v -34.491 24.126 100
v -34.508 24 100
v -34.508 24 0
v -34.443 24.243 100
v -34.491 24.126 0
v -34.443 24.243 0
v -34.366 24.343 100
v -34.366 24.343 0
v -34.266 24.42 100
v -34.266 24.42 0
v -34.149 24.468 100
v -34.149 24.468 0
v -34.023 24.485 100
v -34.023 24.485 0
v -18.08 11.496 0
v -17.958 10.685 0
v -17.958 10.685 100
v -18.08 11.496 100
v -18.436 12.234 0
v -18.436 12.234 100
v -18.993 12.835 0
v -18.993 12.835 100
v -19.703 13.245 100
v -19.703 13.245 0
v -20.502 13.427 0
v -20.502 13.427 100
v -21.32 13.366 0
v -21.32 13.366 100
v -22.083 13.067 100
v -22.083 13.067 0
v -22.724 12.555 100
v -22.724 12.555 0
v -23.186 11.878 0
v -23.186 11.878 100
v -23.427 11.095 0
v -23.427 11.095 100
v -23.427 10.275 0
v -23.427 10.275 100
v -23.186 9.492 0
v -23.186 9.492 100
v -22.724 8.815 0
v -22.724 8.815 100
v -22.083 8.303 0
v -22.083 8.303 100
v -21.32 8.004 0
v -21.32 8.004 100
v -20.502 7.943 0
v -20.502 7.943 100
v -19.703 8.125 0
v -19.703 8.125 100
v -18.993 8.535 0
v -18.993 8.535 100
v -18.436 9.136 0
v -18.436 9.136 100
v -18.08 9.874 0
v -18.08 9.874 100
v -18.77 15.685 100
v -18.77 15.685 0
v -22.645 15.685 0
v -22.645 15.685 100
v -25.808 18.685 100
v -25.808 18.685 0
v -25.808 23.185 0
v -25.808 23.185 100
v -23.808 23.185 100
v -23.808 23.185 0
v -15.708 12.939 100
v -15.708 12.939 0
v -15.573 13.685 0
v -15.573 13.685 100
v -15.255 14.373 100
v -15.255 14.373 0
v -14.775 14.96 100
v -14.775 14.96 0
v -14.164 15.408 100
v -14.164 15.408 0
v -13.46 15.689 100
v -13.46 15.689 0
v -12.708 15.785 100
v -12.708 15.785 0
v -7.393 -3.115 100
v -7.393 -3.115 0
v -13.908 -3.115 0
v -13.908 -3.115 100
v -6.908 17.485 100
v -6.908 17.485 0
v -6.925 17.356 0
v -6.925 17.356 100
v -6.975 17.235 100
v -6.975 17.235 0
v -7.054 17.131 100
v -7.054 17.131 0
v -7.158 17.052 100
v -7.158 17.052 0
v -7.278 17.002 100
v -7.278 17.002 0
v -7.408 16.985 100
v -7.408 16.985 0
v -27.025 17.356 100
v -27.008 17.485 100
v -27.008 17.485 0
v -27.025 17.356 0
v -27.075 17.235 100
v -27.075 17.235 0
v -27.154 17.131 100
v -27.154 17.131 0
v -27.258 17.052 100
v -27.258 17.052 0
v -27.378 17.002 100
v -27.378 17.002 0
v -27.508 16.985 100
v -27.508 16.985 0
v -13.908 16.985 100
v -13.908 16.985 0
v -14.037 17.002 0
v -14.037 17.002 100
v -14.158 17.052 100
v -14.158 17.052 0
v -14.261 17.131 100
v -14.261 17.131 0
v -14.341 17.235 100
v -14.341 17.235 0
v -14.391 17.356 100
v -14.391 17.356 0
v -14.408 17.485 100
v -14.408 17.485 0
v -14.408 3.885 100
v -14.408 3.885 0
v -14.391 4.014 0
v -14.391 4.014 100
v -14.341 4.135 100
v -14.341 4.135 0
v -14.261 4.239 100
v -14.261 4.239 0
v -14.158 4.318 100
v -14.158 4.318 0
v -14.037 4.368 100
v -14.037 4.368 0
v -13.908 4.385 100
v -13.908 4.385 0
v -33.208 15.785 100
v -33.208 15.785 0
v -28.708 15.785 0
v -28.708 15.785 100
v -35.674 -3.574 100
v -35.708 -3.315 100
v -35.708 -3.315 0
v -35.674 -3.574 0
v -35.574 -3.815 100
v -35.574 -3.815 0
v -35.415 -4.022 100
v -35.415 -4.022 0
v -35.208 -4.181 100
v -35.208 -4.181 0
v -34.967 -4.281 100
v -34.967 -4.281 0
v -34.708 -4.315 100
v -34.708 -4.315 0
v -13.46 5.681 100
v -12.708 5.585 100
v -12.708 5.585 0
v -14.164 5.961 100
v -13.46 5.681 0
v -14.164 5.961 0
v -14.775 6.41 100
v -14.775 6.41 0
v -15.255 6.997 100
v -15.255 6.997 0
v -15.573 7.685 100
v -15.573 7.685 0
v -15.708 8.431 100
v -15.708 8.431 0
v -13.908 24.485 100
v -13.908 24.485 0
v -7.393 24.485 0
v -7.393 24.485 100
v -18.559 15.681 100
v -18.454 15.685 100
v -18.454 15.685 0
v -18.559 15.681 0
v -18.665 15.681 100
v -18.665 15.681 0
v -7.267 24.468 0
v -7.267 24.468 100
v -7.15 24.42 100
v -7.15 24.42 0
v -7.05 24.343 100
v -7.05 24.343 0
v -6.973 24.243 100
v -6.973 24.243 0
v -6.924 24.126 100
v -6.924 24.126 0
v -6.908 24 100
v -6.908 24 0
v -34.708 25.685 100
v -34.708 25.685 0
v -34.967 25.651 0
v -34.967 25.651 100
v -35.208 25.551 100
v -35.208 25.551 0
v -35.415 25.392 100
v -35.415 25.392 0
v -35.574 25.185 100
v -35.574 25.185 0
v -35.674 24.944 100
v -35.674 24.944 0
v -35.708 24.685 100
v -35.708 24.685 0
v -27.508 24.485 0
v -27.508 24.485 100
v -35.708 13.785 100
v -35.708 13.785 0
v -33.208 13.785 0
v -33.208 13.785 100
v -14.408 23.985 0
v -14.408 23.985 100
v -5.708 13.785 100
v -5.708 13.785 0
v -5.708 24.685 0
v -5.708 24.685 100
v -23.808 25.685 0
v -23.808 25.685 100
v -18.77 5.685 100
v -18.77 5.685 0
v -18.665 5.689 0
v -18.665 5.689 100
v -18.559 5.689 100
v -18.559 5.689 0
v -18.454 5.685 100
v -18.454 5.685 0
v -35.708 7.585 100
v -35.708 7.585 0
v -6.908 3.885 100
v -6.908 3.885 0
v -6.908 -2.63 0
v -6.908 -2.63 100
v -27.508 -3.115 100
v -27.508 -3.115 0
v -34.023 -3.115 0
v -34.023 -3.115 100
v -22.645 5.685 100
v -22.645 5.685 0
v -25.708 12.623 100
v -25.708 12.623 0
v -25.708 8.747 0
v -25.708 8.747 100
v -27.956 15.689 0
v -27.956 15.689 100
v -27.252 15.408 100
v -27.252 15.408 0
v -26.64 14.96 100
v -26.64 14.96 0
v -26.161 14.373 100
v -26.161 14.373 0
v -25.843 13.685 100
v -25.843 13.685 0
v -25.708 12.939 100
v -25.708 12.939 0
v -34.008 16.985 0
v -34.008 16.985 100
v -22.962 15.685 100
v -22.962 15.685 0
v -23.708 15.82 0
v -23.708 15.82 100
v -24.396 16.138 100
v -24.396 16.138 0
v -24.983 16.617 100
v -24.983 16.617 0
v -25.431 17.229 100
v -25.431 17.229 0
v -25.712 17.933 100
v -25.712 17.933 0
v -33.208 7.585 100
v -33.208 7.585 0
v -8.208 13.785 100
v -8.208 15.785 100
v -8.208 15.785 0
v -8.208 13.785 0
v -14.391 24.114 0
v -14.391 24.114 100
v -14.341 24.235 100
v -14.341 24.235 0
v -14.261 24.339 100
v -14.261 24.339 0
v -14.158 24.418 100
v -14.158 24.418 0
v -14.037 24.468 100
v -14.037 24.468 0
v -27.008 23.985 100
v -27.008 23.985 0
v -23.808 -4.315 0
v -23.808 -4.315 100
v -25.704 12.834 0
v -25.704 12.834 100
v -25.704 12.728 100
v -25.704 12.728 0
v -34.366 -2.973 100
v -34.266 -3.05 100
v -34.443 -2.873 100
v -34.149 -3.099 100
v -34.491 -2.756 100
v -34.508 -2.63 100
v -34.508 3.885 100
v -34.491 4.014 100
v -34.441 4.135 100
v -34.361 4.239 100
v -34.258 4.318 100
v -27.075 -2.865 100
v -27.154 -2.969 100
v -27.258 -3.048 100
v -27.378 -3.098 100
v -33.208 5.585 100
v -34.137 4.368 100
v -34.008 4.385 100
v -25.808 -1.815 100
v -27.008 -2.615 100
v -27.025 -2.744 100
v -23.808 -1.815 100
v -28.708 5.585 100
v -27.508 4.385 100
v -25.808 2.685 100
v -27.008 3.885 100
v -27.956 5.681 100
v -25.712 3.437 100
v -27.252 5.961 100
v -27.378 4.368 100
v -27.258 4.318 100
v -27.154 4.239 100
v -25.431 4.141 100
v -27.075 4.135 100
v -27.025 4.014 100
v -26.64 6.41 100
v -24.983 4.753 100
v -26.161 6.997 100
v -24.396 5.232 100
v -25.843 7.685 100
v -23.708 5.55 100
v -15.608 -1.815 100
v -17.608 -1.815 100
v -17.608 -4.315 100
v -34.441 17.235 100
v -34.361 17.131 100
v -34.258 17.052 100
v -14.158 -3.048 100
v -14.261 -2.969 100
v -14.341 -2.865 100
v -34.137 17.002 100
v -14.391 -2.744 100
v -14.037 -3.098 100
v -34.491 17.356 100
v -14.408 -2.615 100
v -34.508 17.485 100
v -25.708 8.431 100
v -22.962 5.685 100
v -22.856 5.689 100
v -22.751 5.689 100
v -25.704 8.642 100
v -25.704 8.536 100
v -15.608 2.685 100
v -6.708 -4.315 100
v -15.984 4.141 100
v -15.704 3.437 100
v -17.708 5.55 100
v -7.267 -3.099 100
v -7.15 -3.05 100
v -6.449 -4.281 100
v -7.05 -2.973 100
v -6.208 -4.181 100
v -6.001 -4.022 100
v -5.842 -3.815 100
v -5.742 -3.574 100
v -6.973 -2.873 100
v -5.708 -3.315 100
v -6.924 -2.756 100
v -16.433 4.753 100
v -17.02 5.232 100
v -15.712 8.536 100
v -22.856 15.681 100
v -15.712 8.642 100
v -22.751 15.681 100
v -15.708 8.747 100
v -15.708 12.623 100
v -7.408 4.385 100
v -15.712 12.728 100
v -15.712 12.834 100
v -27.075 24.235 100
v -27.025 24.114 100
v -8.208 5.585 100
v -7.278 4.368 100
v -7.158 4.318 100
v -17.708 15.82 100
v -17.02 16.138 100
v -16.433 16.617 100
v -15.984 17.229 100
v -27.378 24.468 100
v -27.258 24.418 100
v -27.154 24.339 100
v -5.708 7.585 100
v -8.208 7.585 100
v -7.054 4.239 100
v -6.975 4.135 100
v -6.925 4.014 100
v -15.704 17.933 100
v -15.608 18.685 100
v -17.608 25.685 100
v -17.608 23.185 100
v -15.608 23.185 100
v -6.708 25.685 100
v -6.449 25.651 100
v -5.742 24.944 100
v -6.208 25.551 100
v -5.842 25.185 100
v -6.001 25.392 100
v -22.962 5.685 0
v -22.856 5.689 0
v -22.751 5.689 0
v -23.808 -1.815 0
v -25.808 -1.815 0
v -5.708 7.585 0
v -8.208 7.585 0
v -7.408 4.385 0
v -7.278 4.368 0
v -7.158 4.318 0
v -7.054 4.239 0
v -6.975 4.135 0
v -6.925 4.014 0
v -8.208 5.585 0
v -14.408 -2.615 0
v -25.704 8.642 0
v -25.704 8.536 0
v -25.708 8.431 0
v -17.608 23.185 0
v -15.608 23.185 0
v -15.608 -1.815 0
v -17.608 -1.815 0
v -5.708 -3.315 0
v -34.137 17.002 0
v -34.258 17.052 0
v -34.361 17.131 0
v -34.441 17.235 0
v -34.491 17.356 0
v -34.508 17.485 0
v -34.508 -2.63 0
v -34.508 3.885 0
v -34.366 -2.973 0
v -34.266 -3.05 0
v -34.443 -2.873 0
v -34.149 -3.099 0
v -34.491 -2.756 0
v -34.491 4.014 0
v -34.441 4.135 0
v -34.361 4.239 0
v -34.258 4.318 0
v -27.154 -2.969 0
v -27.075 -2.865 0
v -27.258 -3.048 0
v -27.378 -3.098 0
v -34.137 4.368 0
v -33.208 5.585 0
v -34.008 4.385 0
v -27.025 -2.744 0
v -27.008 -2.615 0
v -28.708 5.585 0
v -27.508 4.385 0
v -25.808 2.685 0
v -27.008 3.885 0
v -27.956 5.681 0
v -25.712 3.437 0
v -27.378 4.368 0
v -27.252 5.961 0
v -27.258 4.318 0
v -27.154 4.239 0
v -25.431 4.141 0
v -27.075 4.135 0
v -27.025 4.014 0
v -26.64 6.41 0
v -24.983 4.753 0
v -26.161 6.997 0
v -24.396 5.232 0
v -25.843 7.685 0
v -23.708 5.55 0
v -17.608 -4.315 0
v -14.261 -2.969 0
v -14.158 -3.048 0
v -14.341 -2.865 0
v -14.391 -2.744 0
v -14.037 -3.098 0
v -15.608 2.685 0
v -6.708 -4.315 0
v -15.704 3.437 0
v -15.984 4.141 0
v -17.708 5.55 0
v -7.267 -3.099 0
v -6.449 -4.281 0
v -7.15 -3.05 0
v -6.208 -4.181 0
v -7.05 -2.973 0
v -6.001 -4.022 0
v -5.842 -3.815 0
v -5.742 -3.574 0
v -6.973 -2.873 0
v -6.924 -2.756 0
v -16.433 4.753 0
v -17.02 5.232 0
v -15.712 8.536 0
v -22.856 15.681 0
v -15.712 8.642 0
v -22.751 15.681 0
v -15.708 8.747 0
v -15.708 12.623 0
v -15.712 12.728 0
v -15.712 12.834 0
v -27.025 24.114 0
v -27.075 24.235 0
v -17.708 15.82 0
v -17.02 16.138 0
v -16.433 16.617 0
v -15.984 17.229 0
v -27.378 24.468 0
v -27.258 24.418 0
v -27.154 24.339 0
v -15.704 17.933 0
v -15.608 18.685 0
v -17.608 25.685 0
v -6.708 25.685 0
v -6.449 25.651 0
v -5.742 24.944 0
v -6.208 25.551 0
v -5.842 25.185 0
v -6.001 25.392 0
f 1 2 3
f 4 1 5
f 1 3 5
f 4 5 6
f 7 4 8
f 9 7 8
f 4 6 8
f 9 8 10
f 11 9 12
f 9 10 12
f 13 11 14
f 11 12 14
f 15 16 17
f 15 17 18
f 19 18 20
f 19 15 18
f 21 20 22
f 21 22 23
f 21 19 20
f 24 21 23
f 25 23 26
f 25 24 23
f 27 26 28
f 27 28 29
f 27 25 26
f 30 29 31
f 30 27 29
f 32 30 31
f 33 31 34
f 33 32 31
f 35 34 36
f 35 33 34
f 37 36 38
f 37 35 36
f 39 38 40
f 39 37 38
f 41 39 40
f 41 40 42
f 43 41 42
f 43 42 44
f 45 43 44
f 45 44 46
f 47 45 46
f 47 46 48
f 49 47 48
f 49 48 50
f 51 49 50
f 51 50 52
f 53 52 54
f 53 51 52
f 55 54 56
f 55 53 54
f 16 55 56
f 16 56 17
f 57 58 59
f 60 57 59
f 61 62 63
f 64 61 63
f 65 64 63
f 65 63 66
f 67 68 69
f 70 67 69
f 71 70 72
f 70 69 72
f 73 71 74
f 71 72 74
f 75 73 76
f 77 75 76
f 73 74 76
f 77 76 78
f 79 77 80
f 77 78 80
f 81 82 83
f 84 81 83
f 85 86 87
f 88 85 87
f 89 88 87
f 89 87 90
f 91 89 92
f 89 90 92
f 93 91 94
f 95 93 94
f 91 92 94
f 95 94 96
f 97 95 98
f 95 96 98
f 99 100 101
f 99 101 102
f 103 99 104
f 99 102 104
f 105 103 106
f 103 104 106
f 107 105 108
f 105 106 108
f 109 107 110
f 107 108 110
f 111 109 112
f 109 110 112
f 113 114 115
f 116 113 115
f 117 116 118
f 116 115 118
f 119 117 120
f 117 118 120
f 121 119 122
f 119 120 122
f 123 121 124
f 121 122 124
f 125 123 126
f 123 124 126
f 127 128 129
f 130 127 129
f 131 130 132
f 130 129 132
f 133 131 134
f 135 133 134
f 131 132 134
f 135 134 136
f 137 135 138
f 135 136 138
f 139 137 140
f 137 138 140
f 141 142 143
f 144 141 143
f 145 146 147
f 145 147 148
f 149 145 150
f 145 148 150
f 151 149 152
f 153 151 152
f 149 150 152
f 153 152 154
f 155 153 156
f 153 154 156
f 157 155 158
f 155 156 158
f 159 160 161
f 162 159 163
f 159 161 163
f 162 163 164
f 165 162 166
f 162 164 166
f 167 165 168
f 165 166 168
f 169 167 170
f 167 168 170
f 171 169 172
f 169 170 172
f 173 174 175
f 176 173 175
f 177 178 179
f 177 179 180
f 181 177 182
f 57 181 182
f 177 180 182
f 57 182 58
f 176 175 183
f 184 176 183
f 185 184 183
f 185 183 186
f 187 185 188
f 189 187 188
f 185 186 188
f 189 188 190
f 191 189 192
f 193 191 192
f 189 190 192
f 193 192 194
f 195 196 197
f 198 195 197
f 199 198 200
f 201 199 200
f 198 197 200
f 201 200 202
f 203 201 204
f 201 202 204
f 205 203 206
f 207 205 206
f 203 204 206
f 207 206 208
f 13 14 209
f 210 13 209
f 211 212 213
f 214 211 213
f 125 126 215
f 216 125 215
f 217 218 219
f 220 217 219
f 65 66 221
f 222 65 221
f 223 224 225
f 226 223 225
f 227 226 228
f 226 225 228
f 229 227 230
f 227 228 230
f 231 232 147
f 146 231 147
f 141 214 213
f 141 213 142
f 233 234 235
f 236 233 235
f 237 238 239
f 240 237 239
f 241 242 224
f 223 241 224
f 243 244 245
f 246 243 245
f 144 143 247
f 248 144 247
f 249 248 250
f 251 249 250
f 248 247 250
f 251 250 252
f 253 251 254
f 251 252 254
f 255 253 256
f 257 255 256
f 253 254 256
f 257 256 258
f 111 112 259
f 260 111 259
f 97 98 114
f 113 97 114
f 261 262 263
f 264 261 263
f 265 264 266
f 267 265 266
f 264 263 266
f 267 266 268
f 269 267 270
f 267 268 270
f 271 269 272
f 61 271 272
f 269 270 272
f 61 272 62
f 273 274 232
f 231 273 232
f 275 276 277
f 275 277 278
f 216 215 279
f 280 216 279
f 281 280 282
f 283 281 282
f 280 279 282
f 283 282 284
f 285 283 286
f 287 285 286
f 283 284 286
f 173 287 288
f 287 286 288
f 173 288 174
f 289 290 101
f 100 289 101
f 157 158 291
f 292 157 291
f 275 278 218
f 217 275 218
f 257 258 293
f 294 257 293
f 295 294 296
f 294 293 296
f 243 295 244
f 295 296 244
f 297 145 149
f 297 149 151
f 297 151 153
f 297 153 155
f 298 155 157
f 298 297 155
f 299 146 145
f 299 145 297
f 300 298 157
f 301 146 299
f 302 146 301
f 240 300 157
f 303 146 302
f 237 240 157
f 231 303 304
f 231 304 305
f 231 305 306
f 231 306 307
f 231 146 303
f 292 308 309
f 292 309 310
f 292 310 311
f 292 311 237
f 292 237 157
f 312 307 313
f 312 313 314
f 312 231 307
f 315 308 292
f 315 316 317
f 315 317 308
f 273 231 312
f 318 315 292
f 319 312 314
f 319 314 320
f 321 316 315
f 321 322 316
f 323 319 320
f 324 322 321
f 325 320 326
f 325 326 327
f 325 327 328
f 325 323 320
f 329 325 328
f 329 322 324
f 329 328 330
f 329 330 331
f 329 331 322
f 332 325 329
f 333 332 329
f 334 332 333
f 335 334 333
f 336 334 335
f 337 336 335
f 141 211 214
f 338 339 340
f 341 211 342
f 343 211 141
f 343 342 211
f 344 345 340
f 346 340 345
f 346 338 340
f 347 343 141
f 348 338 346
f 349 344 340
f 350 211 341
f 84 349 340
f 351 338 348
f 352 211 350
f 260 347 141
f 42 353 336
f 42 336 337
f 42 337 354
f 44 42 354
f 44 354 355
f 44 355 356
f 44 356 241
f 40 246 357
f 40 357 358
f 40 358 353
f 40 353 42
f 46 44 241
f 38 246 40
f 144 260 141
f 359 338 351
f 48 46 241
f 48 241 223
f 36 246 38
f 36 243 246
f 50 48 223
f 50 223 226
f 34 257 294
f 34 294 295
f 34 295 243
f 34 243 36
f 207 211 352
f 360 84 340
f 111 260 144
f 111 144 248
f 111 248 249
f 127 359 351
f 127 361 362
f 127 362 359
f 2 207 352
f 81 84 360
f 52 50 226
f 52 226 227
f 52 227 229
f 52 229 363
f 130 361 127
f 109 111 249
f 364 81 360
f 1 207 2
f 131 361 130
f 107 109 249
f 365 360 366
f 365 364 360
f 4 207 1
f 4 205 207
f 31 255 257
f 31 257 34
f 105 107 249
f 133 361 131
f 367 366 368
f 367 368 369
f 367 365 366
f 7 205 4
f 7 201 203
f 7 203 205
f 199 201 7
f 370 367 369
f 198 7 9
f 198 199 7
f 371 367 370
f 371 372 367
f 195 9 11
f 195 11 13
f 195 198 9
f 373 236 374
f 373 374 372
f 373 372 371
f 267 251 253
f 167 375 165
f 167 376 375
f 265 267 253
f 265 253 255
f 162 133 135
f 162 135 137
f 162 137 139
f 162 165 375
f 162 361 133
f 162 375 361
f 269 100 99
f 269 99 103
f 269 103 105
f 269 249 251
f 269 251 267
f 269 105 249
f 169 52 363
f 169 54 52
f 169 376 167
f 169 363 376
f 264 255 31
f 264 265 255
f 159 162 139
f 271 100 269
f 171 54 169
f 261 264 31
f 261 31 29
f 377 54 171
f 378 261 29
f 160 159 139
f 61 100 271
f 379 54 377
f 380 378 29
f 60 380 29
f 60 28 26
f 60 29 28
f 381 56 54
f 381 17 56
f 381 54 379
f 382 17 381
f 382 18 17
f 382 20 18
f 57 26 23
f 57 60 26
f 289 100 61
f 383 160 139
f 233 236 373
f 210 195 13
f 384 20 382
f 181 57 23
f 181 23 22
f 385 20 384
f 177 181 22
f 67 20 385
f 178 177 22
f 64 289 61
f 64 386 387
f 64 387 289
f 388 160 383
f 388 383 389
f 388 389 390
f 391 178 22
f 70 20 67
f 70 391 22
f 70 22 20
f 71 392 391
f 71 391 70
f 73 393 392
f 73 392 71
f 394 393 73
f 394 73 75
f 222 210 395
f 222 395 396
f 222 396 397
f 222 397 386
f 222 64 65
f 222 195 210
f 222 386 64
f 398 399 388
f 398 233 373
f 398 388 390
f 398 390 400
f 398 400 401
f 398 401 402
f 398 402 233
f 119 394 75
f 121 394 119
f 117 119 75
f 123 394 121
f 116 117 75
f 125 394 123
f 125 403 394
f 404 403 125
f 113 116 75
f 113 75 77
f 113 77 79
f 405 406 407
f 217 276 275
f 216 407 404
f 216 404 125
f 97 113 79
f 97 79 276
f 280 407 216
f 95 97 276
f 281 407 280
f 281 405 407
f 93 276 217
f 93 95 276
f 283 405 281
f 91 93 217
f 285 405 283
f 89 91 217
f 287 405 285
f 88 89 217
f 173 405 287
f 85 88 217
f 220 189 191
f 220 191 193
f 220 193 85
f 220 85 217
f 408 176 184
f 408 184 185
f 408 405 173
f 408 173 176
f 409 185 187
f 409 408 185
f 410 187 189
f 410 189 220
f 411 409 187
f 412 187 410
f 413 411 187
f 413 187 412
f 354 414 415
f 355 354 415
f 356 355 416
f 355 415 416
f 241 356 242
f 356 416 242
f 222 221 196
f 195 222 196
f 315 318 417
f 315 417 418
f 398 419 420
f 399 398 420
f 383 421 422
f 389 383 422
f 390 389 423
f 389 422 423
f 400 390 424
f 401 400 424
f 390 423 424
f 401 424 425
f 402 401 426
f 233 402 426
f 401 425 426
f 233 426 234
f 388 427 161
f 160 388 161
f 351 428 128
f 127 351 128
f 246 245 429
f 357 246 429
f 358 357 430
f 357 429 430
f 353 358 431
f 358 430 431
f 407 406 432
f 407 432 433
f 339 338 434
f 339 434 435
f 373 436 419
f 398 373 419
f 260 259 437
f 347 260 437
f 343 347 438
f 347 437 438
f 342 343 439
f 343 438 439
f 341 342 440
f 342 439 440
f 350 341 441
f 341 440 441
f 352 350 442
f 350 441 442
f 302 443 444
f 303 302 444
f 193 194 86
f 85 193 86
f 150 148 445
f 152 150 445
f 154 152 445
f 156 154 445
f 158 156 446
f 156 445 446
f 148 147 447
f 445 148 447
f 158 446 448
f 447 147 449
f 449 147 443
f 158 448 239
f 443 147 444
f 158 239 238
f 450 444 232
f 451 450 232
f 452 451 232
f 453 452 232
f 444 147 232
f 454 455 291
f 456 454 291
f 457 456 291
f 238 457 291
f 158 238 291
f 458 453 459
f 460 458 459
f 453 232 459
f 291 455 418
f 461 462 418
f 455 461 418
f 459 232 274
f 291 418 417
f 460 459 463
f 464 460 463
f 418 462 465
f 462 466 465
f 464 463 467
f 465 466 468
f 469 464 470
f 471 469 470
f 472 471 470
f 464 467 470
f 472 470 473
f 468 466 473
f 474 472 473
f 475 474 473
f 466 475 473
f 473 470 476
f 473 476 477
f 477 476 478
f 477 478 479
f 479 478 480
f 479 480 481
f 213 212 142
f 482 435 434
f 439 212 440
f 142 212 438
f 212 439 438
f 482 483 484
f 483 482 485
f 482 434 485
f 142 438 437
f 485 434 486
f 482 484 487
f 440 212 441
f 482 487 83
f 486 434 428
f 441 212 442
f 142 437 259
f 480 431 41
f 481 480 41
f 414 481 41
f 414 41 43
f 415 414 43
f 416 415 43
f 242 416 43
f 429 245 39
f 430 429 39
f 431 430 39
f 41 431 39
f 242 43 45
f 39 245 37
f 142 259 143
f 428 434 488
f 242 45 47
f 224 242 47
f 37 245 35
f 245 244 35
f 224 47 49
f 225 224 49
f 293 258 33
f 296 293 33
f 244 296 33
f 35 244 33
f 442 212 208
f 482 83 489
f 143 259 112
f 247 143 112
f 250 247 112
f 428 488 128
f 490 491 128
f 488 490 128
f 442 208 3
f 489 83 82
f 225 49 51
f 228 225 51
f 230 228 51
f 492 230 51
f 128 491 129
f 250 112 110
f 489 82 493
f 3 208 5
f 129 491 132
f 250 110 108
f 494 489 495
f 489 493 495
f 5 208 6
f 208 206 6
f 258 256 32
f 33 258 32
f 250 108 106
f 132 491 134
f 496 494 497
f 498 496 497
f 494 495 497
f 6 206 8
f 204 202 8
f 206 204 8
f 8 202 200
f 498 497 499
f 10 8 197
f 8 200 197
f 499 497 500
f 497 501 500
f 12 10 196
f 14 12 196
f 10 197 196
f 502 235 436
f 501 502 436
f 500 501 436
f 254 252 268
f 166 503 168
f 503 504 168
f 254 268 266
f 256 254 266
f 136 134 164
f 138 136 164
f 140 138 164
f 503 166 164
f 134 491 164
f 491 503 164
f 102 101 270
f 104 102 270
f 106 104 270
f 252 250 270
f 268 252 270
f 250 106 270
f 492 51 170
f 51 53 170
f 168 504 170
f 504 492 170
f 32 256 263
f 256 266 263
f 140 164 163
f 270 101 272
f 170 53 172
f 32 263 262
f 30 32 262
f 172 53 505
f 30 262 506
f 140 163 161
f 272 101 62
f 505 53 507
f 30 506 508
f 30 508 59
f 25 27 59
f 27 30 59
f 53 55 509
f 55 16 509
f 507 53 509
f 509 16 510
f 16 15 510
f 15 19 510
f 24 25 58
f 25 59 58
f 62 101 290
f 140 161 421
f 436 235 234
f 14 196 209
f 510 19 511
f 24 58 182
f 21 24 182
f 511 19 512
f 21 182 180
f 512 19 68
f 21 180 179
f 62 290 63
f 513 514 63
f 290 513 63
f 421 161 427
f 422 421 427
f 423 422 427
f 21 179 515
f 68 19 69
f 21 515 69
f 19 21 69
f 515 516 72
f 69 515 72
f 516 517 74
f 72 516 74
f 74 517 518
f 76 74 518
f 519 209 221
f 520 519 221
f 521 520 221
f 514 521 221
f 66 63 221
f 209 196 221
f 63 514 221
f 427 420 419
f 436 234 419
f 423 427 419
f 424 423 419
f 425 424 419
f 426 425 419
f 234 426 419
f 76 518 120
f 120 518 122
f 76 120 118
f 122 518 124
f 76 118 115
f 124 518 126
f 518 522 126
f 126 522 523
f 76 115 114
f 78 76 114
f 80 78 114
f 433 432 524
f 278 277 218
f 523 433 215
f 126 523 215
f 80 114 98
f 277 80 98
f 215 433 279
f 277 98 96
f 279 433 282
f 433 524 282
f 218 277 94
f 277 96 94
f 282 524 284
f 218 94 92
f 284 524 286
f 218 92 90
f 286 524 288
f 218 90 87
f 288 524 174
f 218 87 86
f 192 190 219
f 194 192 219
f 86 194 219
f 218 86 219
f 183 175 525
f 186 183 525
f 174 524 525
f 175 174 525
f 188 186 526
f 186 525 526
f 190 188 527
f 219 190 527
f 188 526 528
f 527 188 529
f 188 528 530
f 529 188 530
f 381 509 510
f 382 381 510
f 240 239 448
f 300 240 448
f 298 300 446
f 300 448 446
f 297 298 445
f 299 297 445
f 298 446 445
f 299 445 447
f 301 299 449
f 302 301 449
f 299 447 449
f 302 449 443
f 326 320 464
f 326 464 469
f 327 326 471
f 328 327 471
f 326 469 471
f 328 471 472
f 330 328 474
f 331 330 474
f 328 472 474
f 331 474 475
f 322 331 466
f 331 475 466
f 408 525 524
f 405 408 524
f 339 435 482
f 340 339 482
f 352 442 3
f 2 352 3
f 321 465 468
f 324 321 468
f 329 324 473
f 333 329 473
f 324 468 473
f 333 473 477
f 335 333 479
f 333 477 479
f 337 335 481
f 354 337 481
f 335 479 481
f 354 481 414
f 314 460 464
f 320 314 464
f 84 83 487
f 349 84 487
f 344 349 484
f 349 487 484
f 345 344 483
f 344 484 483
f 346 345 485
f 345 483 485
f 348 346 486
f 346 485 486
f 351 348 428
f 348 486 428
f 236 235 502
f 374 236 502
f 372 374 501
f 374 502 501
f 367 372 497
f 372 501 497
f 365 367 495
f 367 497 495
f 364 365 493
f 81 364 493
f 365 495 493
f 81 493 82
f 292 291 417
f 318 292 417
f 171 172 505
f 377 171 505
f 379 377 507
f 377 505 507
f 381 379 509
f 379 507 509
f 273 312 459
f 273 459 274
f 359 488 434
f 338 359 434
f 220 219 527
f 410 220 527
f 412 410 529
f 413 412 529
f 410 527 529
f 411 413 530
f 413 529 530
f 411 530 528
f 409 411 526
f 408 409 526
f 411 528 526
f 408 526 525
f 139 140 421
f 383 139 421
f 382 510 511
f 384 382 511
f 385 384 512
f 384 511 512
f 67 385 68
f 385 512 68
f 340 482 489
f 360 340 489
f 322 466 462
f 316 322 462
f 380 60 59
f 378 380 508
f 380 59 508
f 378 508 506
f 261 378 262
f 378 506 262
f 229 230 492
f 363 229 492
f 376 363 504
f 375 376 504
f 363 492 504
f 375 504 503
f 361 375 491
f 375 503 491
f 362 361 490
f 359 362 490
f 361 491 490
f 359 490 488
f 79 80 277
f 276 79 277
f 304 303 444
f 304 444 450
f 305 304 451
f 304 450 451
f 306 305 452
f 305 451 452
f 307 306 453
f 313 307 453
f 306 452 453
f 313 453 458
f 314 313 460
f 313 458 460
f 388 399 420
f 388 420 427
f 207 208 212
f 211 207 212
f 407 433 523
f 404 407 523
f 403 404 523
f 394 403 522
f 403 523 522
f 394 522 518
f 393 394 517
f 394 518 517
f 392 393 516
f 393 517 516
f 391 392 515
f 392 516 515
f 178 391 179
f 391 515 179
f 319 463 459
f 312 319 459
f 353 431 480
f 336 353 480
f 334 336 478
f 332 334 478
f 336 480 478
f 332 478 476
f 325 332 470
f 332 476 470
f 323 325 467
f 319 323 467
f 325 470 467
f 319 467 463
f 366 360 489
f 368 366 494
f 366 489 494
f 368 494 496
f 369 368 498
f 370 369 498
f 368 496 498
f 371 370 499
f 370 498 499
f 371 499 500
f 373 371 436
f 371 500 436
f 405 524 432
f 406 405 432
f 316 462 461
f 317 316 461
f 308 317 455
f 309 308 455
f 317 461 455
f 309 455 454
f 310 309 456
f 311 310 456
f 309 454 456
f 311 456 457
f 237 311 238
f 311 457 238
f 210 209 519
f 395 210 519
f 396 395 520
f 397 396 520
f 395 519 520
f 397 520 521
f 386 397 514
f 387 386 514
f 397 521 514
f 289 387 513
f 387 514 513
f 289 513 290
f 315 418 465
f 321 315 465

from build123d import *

# Parameters (mm, degrees)
SKETCH1_6_R         = 2.75
BOSS_EXTRUDE3_DEPTH = 100


with BuildPart() as part:
    # Sketch1_6 → Boss-Extrude3 (new body)
    with BuildSketch(Plane.XY):
        with BuildLine():
            Line((-8.207857566, 15.784975365), (-8.207857566, 13.784975365))
            Line((-8.207857566, 13.784975365), (-5.707857566, 13.784975365))
            Line((-5.707857566, 13.784975365), (-5.707857566, 24.684975365))
            ThreePointArc((-5.707857566, 24.684975365), (-6.000750784, 25.392082146), (-6.707857566, 25.684975365))
            Line((-6.707857566, 25.684975365), (-17.607857566, 25.684975365))
            Line((-17.607857566, 25.684975365), (-17.607857566, 23.184975365))
            Line((-17.607857566, 23.184975365), (-15.607857566, 23.184975365))
            Line((-15.607857566, 23.184975365), (-15.607857566, 18.878818393))
            Line((-15.607857566, 18.878818393), (-15.607857566, 18.684975365))
            ThreePointArc((-15.607857566, 18.684975365), (-16.432542315, 16.617397323), (-18.453822402, 15.684975365))
            ThreePointArc((-18.453822402, 15.684975365), (-18.61202607, 15.680806861), (-18.770229737, 15.684975365))
            Line((-18.770229737, 15.684975365), (-22.645485394, 15.684975365))
            ThreePointArc((-22.645485394, 15.684975365), (-22.803689062, 15.680806861), (-22.961892729, 15.684975365))
            ThreePointArc((-22.961892729, 15.684975365), (-24.983172816, 16.617397323), (-25.807857566, 18.684975365))
            Line((-25.807857566, 18.684975365), (-25.807857566, 18.878818393))
            Line((-25.807857566, 18.878818393), (-25.807857566, 23.184975365))
            Line((-25.807857566, 23.184975365), (-23.807857566, 23.184975365))
            Line((-23.807857566, 23.184975365), (-23.807857566, 25.684975365))
            Line((-23.807857566, 25.684975365), (-34.707857566, 25.684975365))
            ThreePointArc((-34.707857566, 25.684975365), (-35.414964347, 25.392082146), (-35.707857566, 24.684975365))
            Line((-35.707857566, 24.684975365), (-35.707857566, 13.784975365))
            Line((-35.707857566, 13.784975365), (-33.207857566, 13.784975365))
            Line((-33.207857566, 13.784975365), (-33.207857566, 15.784975365))
            Line((-33.207857566, 15.784975365), (-28.901700593, 15.784975365))
            Line((-28.901700593, 15.784975365), (-28.707857566, 15.784975365))
            ThreePointArc((-28.707857566, 15.784975365), (-26.640279523, 14.960290616), (-25.707857566, 12.939010529))
            ThreePointArc((-25.707857566, 12.939010529), (-25.703689062, 12.780806861), (-25.707857566, 12.622603193))
            Line((-25.707857566, 12.622603193), (-25.707857566, 8.747347537))
            ThreePointArc((-25.707857566, 8.747347537), (-25.703689062, 8.589143869), (-25.707857566, 8.430940201))
            ThreePointArc((-25.707857566, 8.430940201), (-26.640279523, 6.409660114), (-28.707857566, 5.584975365))
            Line((-28.707857566, 5.584975365), (-28.901700593, 5.584975365))
            Line((-28.901700593, 5.584975365), (-33.207857566, 5.584975365))
            Line((-33.207857566, 5.584975365), (-33.207857566, 7.584975365))
            Line((-33.207857566, 7.584975365), (-35.707857566, 7.584975365))
            Line((-35.707857566, 7.584975365), (-35.707857566, -3.315024635))
            ThreePointArc((-35.707857566, -3.315024635), (-35.414964347, -4.022131416), (-34.707857566, -4.315024635))
            Line((-34.707857566, -4.315024635), (-23.807857566, -4.315024635))
            Line((-23.807857566, -4.315024635), (-23.807857566, -1.815024635))
            Line((-23.807857566, -1.815024635), (-25.807857566, -1.815024635))
            Line((-25.807857566, -1.815024635), (-25.807857566, 2.491132338))
            Line((-25.807857566, 2.491132338), (-25.807857566, 2.684975365))
            ThreePointArc((-25.807857566, 2.684975365), (-24.983172816, 4.752553408), (-22.961892729, 5.684975365))
            ThreePointArc((-22.961892729, 5.684975365), (-22.803689062, 5.689143869), (-22.645485394, 5.684975365))
            Line((-22.645485394, 5.684975365), (-18.770229737, 5.684975365))
            ThreePointArc((-18.770229737, 5.684975365), (-18.61202607, 5.689143869), (-18.453822402, 5.684975365))
            ThreePointArc((-18.453822402, 5.684975365), (-16.432542315, 4.752553408), (-15.607857566, 2.684975365))
            Line((-15.607857566, 2.684975365), (-15.607857566, 2.491132338))
            Line((-15.607857566, 2.491132338), (-15.607857566, -1.815024635))
            Line((-15.607857566, -1.815024635), (-17.607857566, -1.815024635))
            Line((-17.607857566, -1.815024635), (-17.607857566, -4.315024635))
            Line((-17.607857566, -4.315024635), (-6.707857566, -4.315024635))
            ThreePointArc((-6.707857566, -4.315024635), (-6.000750784, -4.022131416), (-5.707857566, -3.315024635))
            Line((-5.707857566, -3.315024635), (-5.707857566, 7.584975365))
            Line((-5.707857566, 7.584975365), (-8.207857566, 7.584975365))
            Line((-8.207857566, 7.584975365), (-8.207857566, 5.584975365))
            Line((-8.207857566, 5.584975365), (-12.514014538, 5.584975365))
            Line((-12.514014538, 5.584975365), (-12.707857566, 5.584975365))
            ThreePointArc((-12.707857566, 5.584975365), (-14.775435608, 6.409660114), (-15.707857566, 8.430940201))
            ThreePointArc((-15.707857566, 8.430940201), (-15.71202607, 8.589143869), (-15.707857566, 8.747347537))
            Line((-15.707857566, 8.747347537), (-15.707857566, 12.622603193))
            ThreePointArc((-15.707857566, 12.622603193), (-15.71202607, 12.780806861), (-15.707857566, 12.939010529))
            ThreePointArc((-15.707857566, 12.939010529), (-14.775435608, 14.960290616), (-12.707857566, 15.784975365))
            Line((-12.707857566, 15.784975365), (-12.514014538, 15.784975365))
            Line((-12.514014538, 15.784975365), (-8.207857566, 15.784975365))
        make_face()
        with BuildLine():
            Line((-34.507857566, -2.63034887), (-34.507857566, 3.884975365))
            ThreePointArc((-34.507857566, 3.884975365), (-34.361410956, 4.238528756), (-34.007857566, 4.384975365))
            Line((-34.007857566, 4.384975365), (-27.507857566, 4.384975365))
            ThreePointArc((-27.507857566, 4.384975365), (-27.154304175, 4.238528756), (-27.007857566, 3.884975365))
            Line((-27.007857566, 3.884975365), (-27.007857566, -2.615024635))
            ThreePointArc((-27.007857566, -2.615024635), (-27.154304175, -2.968578025), (-27.507857566, -3.115024635))
            Line((-27.507857566, -3.115024635), (-34.023181801, -3.115024635))
            ThreePointArc((-34.023181801, -3.115024635), (-34.365899321, -2.97306639), (-34.507857566, -2.63034887))
        make_face(mode=Mode.SUBTRACT)
        with BuildLine():
            Line((-7.39253333, -3.115024635), (-13.907857566, -3.115024635))
            ThreePointArc((-13.907857566, -3.115024635), (-14.261410956, -2.968578025), (-14.407857566, -2.615024635))
            Line((-14.407857566, -2.615024635), (-14.407857566, 3.884975365))
            ThreePointArc((-14.407857566, 3.884975365), (-14.261410956, 4.238528756), (-13.907857566, 4.384975365))
            Line((-13.907857566, 4.384975365), (-7.407857566, 4.384975365))
            ThreePointArc((-7.407857566, 4.384975365), (-7.054304175, 4.238528756), (-6.907857566, 3.884975365))
            Line((-6.907857566, 3.884975365), (-6.907857566, -2.63034887))
            ThreePointArc((-6.907857566, -2.63034887), (-7.04981581, -2.97306639), (-7.39253333, -3.115024635))
        make_face(mode=Mode.SUBTRACT)
        with BuildLine():
            Line((-34.023181801, 24.484975365), (-27.507857566, 24.484975365))
            ThreePointArc((-27.507857566, 24.484975365), (-27.154304175, 24.338528756), (-27.007857566, 23.984975365))
            Line((-27.007857566, 23.984975365), (-27.007857566, 17.484975365))
            ThreePointArc((-27.007857566, 17.484975365), (-27.154304175, 17.131421975), (-27.507857566, 16.984975365))
            Line((-27.507857566, 16.984975365), (-34.007857566, 16.984975365))
            ThreePointArc((-34.007857566, 16.984975365), (-34.361410956, 17.131421975), (-34.507857566, 17.484975365))
            Line((-34.507857566, 17.484975365), (-34.507857566, 24.000299601))
            ThreePointArc((-34.507857566, 24.000299601), (-34.365899321, 24.34301712), (-34.023181801, 24.484975365))
        make_face(mode=Mode.SUBTRACT)
        with Locations((-20.707857566, 10.684975365)):
            Circle(SKETCH1_6_R, mode=Mode.SUBTRACT)
        with BuildLine():
            Line((-6.907857566, 24.000299601), (-6.907857566, 17.484975365))
            ThreePointArc((-6.907857566, 17.484975365), (-7.054304175, 17.131421975), (-7.407857566, 16.984975365))
            Line((-7.407857566, 16.984975365), (-13.907857566, 16.984975365))
            ThreePointArc((-13.907857566, 16.984975365), (-14.261410956, 17.131421975), (-14.407857566, 17.484975365))
            Line((-14.407857566, 17.484975365), (-14.407857566, 23.984975365))
            ThreePointArc((-14.407857566, 23.984975365), (-14.261410956, 24.338528756), (-13.907857566, 24.484975365))
            Line((-13.907857566, 24.484975365), (-7.39253333, 24.484975365))
            ThreePointArc((-7.39253333, 24.484975365), (-7.04981581, 24.34301712), (-6.907857566, 24.000299601))
        make_face(mode=Mode.SUBTRACT)
    extrude(amount=BOSS_EXTRUDE3_DEPTH)


solid = part.part
